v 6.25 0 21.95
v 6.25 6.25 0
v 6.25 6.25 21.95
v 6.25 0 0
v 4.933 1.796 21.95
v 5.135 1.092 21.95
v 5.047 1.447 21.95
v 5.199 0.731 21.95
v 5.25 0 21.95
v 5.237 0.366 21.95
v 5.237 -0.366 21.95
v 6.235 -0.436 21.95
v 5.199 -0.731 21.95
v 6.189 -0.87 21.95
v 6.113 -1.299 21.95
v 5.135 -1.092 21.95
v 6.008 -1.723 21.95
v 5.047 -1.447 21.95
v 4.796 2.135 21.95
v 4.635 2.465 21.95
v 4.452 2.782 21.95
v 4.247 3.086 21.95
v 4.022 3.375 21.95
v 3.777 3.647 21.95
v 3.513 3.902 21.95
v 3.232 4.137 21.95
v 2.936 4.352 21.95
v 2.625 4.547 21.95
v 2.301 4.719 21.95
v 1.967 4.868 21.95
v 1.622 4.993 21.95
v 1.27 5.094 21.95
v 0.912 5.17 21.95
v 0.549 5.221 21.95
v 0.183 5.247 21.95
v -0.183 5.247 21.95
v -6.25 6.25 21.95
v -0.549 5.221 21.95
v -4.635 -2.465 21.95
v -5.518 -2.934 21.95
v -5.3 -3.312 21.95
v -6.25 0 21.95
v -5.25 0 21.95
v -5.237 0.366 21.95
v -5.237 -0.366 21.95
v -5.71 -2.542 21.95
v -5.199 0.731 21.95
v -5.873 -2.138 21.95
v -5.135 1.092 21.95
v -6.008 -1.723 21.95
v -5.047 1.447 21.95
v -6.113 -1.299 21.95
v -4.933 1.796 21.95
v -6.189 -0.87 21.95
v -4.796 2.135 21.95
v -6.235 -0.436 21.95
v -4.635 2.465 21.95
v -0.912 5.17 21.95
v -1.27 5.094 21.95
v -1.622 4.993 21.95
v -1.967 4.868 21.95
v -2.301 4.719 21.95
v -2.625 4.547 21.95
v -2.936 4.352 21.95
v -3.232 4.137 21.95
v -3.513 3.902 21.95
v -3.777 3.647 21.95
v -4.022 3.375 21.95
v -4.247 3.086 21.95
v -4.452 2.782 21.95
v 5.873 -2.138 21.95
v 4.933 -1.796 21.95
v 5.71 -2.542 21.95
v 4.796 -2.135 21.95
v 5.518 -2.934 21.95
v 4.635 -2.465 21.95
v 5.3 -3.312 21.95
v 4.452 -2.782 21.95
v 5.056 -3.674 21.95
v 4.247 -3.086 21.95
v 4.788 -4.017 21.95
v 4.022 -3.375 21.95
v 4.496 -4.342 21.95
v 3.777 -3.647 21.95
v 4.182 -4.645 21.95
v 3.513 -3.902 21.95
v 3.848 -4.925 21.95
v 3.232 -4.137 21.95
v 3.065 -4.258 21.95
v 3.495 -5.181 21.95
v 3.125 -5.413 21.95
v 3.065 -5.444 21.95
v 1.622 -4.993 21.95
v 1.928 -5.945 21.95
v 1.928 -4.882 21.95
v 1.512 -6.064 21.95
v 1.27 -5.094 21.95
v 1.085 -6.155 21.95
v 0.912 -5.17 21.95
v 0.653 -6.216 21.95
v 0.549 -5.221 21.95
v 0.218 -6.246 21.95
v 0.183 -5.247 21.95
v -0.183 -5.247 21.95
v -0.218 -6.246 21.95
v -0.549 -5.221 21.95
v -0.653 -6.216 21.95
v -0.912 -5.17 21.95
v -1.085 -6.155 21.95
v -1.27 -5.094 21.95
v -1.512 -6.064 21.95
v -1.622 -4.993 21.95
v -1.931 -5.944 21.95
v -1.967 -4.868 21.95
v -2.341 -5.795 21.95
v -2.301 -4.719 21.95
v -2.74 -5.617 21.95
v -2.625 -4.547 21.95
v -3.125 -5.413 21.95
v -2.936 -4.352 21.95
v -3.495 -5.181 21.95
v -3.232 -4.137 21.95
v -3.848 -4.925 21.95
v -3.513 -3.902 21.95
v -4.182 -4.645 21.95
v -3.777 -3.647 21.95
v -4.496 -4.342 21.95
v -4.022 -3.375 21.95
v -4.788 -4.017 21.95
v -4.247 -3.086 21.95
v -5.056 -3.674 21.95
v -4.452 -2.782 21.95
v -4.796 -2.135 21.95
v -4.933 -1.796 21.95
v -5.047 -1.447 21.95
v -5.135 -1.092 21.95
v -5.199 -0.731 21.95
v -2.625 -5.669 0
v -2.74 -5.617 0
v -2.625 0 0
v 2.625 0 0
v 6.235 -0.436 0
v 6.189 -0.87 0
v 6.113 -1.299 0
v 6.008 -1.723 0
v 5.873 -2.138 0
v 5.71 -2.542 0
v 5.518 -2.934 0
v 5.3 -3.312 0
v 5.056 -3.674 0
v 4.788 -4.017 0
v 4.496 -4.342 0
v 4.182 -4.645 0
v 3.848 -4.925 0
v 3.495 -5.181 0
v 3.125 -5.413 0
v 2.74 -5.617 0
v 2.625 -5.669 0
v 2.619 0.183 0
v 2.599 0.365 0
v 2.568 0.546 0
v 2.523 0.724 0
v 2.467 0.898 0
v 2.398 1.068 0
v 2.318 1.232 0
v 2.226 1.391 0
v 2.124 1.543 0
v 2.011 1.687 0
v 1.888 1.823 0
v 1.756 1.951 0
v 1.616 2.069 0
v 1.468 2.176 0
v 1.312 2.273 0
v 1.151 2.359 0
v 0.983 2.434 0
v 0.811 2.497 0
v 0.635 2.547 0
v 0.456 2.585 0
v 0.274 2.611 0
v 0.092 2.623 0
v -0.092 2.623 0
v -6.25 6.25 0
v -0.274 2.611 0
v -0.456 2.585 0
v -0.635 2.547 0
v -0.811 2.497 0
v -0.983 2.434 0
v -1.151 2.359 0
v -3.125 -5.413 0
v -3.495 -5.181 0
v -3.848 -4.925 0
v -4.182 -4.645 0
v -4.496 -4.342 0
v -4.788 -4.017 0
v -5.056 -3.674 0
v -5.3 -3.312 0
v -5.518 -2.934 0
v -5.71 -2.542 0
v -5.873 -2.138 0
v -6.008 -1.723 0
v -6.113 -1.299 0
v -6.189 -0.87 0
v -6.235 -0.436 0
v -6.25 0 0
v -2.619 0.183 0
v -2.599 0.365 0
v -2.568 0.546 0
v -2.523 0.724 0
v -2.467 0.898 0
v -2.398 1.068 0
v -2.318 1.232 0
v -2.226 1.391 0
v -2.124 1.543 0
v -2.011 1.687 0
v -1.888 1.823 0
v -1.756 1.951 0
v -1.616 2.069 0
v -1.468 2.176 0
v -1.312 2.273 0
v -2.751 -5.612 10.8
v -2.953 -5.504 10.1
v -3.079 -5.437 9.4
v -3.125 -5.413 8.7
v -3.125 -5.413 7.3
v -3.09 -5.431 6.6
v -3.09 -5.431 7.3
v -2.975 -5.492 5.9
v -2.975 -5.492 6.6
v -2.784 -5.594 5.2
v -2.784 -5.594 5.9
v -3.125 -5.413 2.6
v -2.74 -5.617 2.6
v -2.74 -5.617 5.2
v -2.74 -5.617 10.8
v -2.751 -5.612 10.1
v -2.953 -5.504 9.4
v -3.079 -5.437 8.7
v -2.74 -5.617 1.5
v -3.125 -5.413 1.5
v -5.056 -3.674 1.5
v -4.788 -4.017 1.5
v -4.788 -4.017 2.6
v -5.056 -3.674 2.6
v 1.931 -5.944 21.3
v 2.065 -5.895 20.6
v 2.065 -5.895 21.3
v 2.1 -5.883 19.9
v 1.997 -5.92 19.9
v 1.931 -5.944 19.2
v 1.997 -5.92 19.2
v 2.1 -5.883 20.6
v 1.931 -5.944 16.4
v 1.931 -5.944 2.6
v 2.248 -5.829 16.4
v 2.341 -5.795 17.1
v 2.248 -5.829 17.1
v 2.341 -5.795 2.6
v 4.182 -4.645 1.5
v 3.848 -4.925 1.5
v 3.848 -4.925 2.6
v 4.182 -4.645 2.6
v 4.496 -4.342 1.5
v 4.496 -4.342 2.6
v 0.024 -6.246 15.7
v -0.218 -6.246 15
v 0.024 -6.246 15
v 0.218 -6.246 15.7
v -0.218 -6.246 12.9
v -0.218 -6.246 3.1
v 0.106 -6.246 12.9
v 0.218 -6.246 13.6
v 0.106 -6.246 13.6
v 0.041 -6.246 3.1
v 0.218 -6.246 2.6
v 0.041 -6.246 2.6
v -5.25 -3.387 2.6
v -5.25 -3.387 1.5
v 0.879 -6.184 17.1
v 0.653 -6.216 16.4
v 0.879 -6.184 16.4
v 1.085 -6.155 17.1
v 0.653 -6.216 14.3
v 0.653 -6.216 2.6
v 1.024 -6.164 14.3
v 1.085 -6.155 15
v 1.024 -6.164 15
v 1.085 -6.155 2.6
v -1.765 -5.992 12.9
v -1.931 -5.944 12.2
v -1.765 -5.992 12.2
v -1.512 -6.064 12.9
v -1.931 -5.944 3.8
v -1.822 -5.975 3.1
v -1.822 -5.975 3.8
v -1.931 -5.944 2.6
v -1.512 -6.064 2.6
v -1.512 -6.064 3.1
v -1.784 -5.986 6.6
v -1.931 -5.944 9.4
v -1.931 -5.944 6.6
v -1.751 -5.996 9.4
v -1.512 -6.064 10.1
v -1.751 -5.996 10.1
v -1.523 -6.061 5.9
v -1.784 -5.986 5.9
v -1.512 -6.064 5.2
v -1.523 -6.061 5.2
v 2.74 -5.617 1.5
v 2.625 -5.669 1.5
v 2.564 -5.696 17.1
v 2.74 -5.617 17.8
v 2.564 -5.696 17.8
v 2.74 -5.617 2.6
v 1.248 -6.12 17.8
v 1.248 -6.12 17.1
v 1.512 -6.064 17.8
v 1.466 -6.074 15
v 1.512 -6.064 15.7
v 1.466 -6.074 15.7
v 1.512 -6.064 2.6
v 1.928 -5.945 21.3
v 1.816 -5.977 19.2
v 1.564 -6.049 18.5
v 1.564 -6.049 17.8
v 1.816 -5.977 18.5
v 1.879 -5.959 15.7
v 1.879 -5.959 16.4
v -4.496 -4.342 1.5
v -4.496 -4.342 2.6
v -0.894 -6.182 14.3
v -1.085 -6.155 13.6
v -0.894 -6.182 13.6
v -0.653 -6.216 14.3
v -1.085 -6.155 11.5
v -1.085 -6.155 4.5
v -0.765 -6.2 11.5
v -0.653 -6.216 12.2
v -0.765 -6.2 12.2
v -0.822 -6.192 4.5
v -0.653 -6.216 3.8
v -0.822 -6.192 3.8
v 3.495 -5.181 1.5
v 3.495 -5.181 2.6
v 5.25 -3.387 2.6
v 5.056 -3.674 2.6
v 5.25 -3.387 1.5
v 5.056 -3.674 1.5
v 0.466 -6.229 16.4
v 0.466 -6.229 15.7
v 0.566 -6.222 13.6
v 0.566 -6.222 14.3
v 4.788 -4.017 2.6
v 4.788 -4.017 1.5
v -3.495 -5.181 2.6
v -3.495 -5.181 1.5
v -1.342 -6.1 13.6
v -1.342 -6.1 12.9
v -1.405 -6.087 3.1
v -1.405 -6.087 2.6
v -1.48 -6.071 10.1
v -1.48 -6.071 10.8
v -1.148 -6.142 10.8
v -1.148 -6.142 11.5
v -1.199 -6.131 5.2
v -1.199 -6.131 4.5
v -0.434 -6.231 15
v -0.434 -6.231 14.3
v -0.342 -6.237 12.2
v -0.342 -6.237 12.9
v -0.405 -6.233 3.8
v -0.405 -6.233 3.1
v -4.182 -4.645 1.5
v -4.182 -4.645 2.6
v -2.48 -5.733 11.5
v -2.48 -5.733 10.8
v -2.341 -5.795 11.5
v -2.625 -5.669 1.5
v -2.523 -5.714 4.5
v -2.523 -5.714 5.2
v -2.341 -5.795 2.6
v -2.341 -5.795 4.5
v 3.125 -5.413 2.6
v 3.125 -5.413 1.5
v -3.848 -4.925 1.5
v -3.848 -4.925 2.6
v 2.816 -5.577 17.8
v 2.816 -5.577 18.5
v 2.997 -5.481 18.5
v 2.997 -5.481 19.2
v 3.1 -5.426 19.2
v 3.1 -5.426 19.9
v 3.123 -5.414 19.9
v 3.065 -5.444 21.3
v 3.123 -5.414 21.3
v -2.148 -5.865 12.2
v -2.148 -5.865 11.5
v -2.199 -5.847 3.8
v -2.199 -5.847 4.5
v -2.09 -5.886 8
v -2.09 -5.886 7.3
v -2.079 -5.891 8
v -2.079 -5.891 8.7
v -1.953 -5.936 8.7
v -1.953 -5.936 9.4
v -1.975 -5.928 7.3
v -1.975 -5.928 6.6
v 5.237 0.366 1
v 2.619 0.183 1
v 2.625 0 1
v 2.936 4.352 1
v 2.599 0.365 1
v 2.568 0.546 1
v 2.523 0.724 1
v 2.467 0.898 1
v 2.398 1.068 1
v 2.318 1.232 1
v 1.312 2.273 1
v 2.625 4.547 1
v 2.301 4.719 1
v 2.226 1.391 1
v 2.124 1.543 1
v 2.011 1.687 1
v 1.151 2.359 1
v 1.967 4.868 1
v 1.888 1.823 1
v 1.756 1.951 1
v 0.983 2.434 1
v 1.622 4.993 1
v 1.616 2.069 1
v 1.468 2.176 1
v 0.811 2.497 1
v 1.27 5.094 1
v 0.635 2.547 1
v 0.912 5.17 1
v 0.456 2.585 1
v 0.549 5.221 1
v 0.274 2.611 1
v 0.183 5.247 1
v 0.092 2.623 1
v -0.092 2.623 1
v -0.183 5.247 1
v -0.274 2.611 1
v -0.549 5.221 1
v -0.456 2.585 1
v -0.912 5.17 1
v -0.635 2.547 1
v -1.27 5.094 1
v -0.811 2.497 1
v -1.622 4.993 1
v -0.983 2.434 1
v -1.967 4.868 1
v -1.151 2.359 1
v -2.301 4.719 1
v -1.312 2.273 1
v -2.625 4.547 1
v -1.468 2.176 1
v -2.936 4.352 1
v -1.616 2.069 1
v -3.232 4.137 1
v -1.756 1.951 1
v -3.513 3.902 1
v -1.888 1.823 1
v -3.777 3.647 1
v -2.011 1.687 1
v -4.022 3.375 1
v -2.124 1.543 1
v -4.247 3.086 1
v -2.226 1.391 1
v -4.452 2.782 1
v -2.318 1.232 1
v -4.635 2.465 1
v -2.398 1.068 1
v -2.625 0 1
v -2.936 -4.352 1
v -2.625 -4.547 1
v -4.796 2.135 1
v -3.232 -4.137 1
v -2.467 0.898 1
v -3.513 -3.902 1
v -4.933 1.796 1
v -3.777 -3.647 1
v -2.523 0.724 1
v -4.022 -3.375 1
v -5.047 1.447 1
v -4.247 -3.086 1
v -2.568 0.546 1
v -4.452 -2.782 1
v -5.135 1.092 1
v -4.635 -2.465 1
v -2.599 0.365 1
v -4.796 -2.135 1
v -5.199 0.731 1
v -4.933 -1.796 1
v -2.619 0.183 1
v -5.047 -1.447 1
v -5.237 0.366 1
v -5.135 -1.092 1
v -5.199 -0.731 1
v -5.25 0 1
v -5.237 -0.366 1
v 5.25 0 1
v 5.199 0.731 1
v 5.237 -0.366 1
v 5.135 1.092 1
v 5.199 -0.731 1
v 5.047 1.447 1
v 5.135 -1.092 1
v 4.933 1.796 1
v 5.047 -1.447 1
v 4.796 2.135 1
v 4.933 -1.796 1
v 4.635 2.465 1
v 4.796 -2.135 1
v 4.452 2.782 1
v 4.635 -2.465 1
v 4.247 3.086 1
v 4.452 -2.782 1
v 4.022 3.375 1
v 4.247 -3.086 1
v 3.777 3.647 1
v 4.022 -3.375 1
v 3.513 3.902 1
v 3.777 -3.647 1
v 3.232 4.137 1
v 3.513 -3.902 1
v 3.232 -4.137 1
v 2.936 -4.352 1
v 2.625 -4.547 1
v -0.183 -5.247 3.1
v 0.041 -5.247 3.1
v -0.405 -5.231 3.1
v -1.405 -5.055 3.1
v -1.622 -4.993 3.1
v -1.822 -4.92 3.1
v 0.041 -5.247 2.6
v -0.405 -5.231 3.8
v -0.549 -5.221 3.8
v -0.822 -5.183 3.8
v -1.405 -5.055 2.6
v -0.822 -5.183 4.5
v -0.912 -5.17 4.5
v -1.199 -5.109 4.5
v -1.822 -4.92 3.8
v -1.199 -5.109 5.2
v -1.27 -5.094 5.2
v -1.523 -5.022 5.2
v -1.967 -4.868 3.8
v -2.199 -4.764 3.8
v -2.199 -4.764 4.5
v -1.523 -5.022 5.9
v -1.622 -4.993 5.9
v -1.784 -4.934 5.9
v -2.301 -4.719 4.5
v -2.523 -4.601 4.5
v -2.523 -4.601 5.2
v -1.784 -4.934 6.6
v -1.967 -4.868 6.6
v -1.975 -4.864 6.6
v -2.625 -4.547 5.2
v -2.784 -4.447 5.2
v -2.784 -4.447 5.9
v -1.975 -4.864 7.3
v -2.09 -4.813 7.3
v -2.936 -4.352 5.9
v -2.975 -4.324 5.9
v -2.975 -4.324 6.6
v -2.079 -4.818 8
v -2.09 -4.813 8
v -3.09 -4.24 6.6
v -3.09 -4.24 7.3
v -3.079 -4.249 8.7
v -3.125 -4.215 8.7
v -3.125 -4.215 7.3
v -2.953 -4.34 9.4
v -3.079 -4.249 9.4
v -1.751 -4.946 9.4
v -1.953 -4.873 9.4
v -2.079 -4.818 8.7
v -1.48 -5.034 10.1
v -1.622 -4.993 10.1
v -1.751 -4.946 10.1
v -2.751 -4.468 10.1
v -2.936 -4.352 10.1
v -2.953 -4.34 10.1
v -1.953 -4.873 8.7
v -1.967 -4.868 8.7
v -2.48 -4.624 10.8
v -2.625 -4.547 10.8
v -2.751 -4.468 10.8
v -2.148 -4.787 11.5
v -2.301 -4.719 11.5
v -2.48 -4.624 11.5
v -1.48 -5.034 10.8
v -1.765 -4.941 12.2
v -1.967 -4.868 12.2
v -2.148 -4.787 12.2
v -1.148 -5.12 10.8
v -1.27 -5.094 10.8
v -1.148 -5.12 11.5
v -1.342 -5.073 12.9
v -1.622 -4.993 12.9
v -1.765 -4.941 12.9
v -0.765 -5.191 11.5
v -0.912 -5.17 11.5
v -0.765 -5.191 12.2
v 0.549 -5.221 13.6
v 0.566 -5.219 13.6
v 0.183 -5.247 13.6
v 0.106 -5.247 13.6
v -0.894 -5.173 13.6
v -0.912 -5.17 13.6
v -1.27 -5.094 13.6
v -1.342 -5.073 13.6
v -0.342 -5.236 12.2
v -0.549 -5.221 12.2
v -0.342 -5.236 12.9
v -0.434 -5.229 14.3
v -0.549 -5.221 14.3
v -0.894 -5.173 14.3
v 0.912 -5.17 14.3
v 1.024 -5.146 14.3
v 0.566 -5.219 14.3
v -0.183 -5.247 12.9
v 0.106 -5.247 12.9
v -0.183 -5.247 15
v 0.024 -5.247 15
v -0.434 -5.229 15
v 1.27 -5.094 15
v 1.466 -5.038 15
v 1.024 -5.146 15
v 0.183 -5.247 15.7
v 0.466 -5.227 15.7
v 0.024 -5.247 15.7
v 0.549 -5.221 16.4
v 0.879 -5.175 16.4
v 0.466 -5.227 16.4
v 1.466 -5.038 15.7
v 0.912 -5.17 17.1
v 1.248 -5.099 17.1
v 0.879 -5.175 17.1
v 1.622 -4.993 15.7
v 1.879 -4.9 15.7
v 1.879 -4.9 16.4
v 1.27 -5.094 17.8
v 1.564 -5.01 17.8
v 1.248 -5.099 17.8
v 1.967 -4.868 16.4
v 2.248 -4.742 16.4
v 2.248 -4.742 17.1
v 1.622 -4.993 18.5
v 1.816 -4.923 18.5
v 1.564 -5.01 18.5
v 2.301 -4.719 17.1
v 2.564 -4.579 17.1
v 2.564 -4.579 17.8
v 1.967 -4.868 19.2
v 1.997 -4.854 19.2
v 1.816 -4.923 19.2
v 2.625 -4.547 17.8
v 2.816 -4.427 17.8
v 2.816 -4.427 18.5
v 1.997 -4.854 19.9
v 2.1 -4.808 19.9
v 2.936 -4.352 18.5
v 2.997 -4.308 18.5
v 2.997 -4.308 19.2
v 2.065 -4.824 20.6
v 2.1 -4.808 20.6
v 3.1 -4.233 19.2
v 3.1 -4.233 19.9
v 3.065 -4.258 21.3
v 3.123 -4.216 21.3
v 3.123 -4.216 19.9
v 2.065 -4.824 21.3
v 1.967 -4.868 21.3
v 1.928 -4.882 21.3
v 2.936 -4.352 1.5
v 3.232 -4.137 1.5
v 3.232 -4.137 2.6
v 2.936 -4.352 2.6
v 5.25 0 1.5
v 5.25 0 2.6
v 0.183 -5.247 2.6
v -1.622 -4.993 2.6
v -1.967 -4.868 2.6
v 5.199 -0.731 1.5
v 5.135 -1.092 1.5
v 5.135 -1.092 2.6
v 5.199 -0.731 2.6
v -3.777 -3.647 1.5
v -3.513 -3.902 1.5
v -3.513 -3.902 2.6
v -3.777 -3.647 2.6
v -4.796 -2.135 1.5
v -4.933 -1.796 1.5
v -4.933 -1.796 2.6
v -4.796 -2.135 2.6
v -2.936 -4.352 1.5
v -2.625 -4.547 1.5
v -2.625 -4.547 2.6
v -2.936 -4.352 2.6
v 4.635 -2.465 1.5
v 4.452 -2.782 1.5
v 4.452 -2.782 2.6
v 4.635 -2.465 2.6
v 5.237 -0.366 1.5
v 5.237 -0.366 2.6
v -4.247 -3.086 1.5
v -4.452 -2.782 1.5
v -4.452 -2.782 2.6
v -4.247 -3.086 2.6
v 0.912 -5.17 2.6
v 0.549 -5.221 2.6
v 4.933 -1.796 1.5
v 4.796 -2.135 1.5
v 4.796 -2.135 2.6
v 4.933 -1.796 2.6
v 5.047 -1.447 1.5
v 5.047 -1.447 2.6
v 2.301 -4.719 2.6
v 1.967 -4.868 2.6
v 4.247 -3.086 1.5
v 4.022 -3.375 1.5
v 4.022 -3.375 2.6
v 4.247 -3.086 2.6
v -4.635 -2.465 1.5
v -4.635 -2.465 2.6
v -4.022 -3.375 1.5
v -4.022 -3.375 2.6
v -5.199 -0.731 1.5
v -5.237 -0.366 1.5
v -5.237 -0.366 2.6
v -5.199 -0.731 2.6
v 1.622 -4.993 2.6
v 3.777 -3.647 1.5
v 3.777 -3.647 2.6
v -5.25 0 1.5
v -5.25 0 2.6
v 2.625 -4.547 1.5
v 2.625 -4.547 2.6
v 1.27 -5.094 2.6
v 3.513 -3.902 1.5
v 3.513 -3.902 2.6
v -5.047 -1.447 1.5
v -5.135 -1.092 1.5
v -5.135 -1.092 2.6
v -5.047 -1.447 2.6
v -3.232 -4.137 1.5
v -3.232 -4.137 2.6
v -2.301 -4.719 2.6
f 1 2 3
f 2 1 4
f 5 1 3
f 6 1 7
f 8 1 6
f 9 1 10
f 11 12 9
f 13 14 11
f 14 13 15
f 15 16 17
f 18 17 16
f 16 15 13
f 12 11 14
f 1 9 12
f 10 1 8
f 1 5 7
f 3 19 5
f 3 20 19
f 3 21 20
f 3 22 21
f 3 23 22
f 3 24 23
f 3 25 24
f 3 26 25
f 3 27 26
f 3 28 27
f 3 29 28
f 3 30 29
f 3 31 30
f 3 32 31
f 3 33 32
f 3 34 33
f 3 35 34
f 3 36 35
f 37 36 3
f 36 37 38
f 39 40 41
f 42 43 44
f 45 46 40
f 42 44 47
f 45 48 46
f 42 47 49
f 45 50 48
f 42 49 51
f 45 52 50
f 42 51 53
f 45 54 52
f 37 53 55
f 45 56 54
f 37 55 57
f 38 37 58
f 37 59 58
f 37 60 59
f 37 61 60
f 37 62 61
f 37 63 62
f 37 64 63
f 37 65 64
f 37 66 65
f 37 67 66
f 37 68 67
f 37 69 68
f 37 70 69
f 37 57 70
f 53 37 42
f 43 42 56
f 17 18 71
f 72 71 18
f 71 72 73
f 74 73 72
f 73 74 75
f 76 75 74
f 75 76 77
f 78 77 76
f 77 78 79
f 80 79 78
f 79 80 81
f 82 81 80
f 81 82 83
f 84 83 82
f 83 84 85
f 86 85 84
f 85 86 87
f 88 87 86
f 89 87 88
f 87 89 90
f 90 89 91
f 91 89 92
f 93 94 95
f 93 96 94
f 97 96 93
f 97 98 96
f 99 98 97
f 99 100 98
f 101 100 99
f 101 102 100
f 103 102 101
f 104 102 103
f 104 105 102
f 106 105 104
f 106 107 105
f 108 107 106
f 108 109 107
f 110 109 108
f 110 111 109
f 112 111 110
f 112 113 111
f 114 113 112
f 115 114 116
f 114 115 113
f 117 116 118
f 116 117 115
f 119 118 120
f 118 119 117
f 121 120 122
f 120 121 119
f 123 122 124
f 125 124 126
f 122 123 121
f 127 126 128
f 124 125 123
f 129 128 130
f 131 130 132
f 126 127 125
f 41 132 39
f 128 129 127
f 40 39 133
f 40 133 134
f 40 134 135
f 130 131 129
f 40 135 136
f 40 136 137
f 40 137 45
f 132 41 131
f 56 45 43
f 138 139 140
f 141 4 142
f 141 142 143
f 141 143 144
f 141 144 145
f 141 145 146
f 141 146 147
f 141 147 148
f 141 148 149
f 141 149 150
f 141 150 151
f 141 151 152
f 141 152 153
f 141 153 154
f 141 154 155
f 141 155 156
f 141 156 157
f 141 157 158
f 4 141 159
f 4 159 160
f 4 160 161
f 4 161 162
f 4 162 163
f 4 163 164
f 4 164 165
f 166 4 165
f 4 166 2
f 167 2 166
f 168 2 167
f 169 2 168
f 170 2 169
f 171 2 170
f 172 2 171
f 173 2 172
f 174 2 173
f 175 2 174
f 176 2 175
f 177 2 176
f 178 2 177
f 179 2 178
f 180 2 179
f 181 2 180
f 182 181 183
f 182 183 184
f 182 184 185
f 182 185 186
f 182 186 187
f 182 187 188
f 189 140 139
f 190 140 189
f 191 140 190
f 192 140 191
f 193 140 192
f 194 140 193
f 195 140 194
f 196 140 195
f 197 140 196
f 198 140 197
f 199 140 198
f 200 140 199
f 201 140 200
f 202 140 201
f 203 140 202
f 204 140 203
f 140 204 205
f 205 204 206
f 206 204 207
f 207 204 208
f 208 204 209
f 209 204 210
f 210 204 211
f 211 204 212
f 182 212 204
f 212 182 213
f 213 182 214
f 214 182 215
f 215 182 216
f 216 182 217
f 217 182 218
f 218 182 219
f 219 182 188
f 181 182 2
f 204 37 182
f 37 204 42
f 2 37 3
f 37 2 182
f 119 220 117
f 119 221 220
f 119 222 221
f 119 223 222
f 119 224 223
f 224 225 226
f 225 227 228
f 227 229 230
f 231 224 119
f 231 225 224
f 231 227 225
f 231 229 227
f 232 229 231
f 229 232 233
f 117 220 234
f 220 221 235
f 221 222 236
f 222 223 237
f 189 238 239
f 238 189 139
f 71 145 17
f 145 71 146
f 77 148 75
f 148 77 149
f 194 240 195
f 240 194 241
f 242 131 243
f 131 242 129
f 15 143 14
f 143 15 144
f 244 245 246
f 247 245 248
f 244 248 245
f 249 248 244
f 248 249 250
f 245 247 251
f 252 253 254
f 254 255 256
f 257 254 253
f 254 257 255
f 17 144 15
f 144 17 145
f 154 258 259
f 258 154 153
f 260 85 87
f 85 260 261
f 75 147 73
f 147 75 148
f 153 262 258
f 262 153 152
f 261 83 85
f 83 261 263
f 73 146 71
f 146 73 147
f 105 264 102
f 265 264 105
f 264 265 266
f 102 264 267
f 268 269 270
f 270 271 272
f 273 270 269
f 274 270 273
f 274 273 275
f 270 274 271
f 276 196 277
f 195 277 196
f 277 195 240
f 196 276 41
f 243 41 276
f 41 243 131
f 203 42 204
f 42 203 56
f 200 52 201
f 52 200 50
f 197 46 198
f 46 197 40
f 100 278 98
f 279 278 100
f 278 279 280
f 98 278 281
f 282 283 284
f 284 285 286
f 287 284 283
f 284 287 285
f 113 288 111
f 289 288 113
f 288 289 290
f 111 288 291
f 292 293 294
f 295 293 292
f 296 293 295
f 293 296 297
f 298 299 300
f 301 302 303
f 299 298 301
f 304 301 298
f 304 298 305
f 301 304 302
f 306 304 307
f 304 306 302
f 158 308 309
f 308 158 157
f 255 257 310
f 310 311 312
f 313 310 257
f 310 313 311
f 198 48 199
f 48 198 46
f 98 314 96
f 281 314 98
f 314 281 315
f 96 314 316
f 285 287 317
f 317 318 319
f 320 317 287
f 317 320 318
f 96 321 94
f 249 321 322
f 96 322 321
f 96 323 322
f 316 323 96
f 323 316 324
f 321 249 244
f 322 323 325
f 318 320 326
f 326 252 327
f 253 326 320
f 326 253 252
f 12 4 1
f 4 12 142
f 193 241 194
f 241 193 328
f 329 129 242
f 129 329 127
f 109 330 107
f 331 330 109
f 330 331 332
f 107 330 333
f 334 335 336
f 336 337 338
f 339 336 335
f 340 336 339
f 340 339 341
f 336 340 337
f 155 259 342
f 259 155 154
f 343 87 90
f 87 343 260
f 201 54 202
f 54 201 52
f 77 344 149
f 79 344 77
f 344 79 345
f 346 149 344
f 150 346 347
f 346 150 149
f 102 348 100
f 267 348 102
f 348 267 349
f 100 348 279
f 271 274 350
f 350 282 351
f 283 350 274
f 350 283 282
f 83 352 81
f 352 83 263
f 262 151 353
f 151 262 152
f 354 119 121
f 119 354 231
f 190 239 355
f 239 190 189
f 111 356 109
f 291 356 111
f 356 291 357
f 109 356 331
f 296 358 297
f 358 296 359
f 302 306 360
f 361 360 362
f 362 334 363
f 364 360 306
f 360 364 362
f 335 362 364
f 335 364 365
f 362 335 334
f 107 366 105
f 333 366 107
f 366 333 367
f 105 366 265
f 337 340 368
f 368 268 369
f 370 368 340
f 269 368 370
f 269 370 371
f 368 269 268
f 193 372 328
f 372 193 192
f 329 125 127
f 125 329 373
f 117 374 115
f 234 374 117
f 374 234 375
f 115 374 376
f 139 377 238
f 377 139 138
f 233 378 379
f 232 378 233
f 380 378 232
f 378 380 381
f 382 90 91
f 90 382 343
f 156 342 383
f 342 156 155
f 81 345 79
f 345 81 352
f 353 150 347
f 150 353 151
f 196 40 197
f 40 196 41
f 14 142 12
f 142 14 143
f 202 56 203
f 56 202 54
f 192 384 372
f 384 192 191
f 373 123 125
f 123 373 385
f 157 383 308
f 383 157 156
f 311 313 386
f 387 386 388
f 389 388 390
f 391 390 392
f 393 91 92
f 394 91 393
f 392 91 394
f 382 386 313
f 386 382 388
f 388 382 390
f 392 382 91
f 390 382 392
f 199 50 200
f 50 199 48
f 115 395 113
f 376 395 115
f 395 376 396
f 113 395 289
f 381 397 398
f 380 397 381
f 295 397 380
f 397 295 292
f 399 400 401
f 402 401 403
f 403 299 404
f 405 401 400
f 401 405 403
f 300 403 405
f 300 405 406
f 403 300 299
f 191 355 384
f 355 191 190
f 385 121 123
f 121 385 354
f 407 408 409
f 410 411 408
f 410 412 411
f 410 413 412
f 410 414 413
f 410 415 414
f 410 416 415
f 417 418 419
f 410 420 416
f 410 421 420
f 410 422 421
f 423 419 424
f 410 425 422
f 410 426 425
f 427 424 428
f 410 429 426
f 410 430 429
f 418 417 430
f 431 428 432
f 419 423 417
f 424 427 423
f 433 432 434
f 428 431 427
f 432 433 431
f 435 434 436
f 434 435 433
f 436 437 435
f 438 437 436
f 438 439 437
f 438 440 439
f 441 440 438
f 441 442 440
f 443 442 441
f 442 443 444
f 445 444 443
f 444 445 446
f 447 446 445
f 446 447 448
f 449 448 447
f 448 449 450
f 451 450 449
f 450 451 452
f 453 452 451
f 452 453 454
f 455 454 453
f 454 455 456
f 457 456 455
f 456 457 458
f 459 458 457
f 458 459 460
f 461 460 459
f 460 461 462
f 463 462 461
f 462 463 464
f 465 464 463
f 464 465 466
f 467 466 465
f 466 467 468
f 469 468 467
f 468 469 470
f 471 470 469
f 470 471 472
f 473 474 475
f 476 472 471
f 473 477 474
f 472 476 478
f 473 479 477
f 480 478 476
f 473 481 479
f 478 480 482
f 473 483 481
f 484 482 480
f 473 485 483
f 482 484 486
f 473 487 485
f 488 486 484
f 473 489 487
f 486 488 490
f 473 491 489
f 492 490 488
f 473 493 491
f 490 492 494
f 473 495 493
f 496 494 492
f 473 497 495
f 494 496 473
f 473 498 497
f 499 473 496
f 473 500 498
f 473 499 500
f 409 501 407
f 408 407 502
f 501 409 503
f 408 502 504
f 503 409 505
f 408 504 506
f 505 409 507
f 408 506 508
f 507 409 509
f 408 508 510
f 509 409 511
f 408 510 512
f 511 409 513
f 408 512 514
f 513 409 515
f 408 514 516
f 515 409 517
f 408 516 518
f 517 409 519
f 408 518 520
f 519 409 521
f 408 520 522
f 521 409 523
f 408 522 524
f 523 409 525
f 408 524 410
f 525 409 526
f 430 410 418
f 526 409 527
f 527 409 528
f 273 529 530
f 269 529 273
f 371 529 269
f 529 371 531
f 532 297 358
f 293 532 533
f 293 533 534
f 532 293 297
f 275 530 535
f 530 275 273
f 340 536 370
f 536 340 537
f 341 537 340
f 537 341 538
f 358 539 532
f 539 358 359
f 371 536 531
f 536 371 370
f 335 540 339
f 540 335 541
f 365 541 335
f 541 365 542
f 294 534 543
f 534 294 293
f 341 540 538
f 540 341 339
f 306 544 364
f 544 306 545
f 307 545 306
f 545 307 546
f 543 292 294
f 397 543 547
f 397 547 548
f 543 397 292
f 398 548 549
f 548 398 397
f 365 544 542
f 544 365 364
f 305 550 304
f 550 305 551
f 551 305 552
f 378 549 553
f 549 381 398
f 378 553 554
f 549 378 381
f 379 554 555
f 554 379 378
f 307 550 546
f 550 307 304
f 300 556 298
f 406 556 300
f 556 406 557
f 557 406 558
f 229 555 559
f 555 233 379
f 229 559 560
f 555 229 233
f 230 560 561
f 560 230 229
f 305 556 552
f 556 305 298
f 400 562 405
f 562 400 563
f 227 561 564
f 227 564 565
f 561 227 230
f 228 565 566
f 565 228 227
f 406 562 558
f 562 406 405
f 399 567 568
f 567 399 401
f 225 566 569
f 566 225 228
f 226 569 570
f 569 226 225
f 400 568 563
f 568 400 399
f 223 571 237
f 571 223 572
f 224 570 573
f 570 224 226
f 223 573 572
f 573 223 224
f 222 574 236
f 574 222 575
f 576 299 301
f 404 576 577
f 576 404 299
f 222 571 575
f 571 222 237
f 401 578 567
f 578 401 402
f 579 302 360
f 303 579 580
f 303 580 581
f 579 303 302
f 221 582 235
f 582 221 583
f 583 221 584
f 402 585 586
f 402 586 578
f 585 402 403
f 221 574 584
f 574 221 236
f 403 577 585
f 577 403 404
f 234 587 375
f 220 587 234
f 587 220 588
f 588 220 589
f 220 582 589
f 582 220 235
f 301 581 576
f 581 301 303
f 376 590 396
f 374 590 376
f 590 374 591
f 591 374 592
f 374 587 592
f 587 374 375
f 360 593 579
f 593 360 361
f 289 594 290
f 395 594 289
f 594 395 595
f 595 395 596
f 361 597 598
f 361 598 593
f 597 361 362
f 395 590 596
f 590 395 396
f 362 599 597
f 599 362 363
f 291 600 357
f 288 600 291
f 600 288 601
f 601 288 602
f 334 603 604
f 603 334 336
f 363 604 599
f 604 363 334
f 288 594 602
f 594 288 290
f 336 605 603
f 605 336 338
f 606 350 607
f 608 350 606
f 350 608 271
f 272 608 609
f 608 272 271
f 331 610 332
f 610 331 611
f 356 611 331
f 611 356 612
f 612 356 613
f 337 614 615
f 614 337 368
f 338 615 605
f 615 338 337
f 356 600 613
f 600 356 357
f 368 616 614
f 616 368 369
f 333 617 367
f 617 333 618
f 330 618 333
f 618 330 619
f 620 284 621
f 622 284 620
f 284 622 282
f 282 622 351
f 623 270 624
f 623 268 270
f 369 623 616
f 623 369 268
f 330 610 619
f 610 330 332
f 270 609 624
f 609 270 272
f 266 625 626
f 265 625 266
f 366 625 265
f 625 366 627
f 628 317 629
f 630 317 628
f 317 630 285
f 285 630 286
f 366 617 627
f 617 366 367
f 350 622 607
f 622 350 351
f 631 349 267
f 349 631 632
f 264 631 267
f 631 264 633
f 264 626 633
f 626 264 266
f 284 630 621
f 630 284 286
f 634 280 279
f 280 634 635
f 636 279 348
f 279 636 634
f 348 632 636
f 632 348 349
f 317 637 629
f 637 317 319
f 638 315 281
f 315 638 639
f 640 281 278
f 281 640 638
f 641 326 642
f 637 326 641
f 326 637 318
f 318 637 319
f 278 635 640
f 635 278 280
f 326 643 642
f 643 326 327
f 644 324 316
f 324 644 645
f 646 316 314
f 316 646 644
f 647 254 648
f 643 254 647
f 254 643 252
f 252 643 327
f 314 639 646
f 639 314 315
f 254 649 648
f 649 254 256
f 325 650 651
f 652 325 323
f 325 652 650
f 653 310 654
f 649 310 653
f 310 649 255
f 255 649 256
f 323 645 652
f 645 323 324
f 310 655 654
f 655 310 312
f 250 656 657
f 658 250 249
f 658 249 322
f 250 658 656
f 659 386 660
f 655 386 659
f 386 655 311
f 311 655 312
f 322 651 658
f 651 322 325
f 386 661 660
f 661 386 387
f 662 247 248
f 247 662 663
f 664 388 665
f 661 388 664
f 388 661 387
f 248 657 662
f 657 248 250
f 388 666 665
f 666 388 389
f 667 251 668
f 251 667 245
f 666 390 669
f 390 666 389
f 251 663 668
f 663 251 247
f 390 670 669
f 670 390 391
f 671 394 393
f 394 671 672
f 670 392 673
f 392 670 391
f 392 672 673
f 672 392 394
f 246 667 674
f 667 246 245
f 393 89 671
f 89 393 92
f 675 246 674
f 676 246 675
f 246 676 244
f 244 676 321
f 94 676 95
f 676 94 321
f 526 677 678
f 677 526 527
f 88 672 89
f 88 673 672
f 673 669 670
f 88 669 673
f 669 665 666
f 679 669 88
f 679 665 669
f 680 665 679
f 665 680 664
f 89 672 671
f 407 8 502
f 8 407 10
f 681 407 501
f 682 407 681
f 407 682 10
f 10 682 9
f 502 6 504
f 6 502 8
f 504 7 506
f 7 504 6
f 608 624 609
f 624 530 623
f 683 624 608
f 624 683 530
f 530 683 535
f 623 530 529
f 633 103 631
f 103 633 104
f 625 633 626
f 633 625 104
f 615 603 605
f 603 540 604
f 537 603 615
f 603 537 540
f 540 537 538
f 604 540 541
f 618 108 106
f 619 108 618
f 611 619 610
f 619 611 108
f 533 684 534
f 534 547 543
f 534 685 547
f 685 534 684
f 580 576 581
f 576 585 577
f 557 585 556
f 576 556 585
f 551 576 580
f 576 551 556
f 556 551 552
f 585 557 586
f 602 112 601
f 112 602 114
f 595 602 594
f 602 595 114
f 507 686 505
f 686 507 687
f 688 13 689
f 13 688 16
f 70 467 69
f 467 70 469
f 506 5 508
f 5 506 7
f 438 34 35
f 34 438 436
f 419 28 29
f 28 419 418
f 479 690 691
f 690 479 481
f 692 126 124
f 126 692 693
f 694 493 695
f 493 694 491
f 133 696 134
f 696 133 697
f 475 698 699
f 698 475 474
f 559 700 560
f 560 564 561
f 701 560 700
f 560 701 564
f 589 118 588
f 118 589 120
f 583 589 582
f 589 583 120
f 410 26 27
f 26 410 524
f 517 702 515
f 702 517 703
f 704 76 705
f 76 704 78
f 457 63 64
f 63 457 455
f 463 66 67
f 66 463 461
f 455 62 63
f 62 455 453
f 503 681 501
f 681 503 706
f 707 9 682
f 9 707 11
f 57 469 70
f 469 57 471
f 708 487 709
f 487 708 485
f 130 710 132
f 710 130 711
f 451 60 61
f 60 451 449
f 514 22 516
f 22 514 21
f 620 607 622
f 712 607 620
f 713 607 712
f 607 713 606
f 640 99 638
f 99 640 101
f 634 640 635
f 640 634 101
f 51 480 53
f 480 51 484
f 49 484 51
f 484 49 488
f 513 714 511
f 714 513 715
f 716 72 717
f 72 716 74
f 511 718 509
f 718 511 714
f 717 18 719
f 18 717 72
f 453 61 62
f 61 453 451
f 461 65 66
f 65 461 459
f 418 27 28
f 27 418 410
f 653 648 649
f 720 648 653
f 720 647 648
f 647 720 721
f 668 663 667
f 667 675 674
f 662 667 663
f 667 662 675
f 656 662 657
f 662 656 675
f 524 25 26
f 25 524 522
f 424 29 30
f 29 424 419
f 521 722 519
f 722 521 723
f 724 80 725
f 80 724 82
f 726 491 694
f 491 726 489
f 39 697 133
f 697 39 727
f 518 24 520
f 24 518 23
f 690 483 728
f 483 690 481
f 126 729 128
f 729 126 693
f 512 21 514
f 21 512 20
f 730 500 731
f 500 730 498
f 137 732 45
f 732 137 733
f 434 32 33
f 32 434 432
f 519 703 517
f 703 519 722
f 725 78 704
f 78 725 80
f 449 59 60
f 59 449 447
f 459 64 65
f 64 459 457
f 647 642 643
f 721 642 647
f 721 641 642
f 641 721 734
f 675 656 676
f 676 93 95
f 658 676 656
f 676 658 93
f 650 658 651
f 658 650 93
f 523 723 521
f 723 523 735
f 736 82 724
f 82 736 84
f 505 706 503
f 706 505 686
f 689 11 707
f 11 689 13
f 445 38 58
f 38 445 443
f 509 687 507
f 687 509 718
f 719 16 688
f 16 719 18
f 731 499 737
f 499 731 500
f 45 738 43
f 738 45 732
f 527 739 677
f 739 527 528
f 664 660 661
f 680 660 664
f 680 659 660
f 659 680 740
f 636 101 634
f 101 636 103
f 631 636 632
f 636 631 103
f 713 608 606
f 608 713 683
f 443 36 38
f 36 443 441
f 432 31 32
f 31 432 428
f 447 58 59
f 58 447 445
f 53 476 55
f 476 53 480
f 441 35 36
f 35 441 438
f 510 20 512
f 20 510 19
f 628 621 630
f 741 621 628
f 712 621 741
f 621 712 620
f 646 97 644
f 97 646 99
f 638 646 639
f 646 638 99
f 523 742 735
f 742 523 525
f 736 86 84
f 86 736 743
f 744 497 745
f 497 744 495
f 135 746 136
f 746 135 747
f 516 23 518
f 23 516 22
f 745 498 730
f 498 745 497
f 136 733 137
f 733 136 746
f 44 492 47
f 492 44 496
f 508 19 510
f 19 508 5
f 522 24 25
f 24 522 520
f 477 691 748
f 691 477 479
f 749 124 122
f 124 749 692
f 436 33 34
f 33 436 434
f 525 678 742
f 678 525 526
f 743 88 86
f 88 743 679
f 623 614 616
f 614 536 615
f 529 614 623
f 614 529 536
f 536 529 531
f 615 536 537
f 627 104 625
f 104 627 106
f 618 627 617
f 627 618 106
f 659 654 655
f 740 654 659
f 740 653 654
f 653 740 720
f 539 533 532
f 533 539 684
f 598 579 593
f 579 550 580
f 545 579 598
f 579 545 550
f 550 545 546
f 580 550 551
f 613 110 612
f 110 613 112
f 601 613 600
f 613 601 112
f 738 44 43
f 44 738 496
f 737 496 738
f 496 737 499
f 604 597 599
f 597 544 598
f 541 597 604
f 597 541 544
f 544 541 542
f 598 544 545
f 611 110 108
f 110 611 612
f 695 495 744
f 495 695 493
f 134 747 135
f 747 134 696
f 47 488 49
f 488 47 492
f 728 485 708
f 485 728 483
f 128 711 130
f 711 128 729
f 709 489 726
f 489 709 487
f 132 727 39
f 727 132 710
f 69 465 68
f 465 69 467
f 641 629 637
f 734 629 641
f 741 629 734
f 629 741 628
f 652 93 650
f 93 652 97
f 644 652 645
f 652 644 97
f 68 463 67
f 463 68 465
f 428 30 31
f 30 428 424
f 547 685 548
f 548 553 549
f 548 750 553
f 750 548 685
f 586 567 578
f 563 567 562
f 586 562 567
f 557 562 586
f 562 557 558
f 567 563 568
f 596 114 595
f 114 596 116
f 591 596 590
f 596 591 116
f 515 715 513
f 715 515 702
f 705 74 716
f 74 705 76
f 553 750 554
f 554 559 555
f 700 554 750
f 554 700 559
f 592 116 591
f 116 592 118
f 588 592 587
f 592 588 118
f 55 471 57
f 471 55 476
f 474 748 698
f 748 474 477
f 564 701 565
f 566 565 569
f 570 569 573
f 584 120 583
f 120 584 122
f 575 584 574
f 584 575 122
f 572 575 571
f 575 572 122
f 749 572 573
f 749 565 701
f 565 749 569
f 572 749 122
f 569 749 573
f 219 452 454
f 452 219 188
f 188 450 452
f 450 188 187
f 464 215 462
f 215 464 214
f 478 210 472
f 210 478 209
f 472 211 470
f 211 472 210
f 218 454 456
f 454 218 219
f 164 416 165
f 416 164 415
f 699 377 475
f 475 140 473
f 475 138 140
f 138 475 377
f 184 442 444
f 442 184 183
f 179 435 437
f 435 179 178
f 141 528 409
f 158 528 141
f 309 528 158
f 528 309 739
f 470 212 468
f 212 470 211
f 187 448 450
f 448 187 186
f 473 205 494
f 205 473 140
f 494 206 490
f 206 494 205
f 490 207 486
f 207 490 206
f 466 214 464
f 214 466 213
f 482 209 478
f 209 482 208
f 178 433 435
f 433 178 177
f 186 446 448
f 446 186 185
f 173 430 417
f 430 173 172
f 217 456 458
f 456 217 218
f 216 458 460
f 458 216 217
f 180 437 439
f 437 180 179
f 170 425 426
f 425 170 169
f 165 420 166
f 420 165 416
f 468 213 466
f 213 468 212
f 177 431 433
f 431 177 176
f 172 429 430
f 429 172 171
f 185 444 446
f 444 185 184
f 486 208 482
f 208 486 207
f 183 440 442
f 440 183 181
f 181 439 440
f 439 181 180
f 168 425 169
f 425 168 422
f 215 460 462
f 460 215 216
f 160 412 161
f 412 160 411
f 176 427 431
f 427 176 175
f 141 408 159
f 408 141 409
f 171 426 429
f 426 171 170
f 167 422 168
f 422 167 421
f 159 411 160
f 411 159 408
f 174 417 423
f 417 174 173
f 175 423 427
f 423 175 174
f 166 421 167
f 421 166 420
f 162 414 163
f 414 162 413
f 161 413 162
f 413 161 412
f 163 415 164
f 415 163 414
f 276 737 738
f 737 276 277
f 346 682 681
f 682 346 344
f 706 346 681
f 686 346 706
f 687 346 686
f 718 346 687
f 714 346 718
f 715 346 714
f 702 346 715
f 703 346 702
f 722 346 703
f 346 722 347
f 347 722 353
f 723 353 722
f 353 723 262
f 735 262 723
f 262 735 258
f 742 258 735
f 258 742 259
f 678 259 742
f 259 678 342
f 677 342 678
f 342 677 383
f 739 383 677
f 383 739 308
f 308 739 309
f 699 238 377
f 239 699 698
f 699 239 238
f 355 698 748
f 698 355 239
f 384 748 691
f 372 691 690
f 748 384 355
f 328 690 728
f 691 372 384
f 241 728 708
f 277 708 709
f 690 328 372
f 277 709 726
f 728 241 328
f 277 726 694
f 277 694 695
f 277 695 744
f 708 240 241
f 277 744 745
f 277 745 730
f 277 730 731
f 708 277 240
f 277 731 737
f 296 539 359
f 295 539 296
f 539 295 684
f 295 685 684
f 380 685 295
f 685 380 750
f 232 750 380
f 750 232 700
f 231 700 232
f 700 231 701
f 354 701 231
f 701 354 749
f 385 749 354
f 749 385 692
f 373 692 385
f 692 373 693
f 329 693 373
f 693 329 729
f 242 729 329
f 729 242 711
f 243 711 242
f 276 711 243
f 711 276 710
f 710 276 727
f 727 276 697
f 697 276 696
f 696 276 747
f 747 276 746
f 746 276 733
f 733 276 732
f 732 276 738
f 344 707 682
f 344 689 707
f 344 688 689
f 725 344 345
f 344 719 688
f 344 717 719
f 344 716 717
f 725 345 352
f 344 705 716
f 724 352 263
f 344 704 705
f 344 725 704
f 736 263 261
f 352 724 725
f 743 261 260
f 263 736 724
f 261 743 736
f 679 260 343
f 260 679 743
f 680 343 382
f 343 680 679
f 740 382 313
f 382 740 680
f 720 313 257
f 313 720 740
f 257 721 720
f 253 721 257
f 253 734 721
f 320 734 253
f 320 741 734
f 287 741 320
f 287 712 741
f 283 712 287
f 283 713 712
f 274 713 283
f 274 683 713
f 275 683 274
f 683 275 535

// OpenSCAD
coin_diameter = 10;
coin_depth = 1;
number_of_coins = 20;

coin_diameter_space = 0.5;
coin_depth_space = 0.05;

wall_width = 1;
floor_depth = 1;

tube_inner_height = coin_depth * number_of_coins + coin_depth_space * (number_of_coins - 1);
tube_inner_diameter = coin_diameter + coin_diameter_space;

floor_slot_diameter = tube_inner_diameter / 2;

coin_slot_height = coin_depth + 2*coin_depth_space;
coin_slot_lip = coin_depth / 2;

tube_outer_height = tube_inner_height + floor_depth;
tube_outer_diameter = tube_inner_diameter + wall_width;

slot_width = 1;
slot_wavelength = 25;

$fn = 90;
slot_resolution = 0.7;

slack = 1;

module sine_wave (length, depth, height, amplitude, wavelength, resolution)
{
	for(i=[0:(length / resolution)])
	{
		translate([i * resolution, sin(i * 360 / wavelength * resolution)*amplitude - height/2, 0])
		cube([resolution * 2, height, depth]);
	}
}

module tube (inner_diameter, inner_height, floor_depth, wall_width)
{
	outer_height = inner_height + floor_depth;
	outer_diameter = inner_diameter + 2*wall_width;
	slot_amplitude = inner_diameter / 4;

	difference()
	{
		union()
		{
			translate([-outer_diameter/2, 0, 0])
			cube([outer_diameter, outer_diameter/2, outer_height]);

			cylinder(h=outer_height, d=outer_diameter);
		}

		union()
		{
			translate([0, 0, floor_depth])
			cylinder(h=inner_height + slack, d=inner_diameter);

			translate([0, 0, floor_depth])
			rotate([90, -90, 0])
			sine_wave(inner_height + slack, inner_diameter, slot_width, slot_amplitude, slot_wavelength, slot_resolution);
		}
	}
}

difference()
{
	tube(tube_inner_diameter, tube_inner_height, floor_depth, wall_width);

	union()
	{
		translate([0, 0, -slack])
		hull()
		{
			cylinder(h=2*slack + floor_depth + coin_slot_lip, d=floor_slot_diameter);

			translate([0, -tube_inner_diameter, 0])
			cylinder(h=2*slack + floor_depth + coin_slot_lip, d=floor_slot_diameter);
		}

		translate([0, 0, floor_depth + coin_slot_lip])
		hull()
		{
			cylinder(h=coin_slot_height, d=tube_inner_diameter);

			translate([0, -tube_inner_diameter, 0])
			cylinder(h=coin_slot_height, d=tube_inner_diameter);
		}
	}
}
